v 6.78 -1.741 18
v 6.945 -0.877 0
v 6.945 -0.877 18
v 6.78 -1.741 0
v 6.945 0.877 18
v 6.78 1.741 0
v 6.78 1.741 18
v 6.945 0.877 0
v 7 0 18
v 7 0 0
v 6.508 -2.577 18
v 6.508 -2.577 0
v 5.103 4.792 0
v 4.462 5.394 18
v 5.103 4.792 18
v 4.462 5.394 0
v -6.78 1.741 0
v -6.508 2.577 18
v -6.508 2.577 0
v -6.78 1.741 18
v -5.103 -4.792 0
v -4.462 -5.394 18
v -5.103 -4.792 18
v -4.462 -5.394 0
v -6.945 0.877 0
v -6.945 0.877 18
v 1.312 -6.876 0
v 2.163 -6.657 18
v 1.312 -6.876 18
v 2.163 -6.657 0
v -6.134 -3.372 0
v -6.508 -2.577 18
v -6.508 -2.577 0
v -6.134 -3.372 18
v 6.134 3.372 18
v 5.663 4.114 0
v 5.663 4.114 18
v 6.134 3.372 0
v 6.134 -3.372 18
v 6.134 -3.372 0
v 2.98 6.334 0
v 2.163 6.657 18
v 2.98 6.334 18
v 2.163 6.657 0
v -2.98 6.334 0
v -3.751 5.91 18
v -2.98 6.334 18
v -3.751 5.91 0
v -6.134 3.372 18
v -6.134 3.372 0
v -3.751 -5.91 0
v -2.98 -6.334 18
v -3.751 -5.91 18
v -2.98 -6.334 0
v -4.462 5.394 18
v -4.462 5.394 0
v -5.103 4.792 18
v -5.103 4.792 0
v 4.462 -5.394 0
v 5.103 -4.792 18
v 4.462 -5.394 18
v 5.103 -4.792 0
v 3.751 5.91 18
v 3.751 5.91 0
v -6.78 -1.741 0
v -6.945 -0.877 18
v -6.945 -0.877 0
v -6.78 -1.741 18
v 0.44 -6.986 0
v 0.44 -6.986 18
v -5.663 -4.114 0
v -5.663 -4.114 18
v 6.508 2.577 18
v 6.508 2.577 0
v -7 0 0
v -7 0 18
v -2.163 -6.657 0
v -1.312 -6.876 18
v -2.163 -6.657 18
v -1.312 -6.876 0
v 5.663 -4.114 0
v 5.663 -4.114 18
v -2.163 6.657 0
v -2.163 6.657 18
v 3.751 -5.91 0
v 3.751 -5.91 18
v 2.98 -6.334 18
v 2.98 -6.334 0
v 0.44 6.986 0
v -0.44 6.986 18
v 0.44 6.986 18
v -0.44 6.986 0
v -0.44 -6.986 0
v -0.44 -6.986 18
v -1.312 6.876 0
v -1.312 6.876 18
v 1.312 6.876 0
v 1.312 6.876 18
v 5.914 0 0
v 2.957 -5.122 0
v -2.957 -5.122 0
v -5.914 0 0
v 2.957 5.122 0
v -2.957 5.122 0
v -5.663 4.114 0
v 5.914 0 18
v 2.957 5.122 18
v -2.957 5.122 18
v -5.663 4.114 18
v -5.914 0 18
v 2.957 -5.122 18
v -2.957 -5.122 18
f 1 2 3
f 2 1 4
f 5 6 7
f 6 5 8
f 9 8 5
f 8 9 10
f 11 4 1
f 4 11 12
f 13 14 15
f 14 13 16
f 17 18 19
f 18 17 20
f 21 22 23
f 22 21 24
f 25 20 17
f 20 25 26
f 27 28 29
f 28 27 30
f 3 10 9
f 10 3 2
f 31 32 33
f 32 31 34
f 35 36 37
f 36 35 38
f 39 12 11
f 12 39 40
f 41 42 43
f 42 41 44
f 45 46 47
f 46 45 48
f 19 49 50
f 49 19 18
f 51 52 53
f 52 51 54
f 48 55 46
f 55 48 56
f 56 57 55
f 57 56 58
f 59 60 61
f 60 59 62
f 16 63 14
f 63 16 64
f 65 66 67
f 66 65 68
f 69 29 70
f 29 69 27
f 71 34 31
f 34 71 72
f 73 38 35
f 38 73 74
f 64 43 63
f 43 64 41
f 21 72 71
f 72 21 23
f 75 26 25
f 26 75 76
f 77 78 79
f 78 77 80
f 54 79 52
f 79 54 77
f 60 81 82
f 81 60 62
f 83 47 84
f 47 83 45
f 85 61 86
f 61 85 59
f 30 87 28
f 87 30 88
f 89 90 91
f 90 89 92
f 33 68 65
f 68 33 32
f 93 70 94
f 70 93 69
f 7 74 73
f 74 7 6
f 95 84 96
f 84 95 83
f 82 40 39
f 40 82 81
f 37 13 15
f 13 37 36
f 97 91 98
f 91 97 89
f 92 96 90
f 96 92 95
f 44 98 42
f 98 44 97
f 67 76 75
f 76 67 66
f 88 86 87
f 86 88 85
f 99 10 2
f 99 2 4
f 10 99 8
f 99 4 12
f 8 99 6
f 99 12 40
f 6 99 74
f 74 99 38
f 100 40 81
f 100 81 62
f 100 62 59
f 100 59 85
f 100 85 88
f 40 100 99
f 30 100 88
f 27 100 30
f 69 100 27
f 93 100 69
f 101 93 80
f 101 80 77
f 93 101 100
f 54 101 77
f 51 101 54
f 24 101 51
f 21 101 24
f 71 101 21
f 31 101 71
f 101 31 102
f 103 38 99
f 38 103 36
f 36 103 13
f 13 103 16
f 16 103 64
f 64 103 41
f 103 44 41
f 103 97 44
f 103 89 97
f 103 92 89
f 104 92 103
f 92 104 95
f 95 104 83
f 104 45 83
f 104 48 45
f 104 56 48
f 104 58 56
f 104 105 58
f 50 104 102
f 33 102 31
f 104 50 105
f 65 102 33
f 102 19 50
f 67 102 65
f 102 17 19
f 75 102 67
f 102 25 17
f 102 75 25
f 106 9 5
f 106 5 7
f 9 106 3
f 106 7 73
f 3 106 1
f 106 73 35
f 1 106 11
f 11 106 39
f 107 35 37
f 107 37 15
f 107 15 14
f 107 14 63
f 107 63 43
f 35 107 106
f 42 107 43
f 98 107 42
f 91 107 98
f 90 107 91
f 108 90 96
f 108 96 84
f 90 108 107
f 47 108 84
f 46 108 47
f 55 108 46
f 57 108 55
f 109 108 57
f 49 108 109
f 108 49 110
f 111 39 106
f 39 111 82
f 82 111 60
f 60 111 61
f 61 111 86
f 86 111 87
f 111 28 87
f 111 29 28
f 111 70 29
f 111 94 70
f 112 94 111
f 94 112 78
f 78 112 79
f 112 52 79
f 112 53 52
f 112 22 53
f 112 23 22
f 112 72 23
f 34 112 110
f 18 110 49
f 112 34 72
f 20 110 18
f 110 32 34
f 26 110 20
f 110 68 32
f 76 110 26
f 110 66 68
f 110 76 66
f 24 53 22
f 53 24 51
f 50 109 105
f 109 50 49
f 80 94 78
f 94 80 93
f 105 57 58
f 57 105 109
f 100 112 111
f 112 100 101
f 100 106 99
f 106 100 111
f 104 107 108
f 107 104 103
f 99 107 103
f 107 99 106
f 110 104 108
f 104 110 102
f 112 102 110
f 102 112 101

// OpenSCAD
// Dimensions in mm
thickness = 18;
pocket_depth = 18;

$fn = 50;
difference() {
    cylinder(r=7,h=thickness);
    translate([0,0,-1]) cylinder(r=3.25,h=thickness+2);
    cylinder(r=5.91425,h=pocket_depth,$fn=6);
}
